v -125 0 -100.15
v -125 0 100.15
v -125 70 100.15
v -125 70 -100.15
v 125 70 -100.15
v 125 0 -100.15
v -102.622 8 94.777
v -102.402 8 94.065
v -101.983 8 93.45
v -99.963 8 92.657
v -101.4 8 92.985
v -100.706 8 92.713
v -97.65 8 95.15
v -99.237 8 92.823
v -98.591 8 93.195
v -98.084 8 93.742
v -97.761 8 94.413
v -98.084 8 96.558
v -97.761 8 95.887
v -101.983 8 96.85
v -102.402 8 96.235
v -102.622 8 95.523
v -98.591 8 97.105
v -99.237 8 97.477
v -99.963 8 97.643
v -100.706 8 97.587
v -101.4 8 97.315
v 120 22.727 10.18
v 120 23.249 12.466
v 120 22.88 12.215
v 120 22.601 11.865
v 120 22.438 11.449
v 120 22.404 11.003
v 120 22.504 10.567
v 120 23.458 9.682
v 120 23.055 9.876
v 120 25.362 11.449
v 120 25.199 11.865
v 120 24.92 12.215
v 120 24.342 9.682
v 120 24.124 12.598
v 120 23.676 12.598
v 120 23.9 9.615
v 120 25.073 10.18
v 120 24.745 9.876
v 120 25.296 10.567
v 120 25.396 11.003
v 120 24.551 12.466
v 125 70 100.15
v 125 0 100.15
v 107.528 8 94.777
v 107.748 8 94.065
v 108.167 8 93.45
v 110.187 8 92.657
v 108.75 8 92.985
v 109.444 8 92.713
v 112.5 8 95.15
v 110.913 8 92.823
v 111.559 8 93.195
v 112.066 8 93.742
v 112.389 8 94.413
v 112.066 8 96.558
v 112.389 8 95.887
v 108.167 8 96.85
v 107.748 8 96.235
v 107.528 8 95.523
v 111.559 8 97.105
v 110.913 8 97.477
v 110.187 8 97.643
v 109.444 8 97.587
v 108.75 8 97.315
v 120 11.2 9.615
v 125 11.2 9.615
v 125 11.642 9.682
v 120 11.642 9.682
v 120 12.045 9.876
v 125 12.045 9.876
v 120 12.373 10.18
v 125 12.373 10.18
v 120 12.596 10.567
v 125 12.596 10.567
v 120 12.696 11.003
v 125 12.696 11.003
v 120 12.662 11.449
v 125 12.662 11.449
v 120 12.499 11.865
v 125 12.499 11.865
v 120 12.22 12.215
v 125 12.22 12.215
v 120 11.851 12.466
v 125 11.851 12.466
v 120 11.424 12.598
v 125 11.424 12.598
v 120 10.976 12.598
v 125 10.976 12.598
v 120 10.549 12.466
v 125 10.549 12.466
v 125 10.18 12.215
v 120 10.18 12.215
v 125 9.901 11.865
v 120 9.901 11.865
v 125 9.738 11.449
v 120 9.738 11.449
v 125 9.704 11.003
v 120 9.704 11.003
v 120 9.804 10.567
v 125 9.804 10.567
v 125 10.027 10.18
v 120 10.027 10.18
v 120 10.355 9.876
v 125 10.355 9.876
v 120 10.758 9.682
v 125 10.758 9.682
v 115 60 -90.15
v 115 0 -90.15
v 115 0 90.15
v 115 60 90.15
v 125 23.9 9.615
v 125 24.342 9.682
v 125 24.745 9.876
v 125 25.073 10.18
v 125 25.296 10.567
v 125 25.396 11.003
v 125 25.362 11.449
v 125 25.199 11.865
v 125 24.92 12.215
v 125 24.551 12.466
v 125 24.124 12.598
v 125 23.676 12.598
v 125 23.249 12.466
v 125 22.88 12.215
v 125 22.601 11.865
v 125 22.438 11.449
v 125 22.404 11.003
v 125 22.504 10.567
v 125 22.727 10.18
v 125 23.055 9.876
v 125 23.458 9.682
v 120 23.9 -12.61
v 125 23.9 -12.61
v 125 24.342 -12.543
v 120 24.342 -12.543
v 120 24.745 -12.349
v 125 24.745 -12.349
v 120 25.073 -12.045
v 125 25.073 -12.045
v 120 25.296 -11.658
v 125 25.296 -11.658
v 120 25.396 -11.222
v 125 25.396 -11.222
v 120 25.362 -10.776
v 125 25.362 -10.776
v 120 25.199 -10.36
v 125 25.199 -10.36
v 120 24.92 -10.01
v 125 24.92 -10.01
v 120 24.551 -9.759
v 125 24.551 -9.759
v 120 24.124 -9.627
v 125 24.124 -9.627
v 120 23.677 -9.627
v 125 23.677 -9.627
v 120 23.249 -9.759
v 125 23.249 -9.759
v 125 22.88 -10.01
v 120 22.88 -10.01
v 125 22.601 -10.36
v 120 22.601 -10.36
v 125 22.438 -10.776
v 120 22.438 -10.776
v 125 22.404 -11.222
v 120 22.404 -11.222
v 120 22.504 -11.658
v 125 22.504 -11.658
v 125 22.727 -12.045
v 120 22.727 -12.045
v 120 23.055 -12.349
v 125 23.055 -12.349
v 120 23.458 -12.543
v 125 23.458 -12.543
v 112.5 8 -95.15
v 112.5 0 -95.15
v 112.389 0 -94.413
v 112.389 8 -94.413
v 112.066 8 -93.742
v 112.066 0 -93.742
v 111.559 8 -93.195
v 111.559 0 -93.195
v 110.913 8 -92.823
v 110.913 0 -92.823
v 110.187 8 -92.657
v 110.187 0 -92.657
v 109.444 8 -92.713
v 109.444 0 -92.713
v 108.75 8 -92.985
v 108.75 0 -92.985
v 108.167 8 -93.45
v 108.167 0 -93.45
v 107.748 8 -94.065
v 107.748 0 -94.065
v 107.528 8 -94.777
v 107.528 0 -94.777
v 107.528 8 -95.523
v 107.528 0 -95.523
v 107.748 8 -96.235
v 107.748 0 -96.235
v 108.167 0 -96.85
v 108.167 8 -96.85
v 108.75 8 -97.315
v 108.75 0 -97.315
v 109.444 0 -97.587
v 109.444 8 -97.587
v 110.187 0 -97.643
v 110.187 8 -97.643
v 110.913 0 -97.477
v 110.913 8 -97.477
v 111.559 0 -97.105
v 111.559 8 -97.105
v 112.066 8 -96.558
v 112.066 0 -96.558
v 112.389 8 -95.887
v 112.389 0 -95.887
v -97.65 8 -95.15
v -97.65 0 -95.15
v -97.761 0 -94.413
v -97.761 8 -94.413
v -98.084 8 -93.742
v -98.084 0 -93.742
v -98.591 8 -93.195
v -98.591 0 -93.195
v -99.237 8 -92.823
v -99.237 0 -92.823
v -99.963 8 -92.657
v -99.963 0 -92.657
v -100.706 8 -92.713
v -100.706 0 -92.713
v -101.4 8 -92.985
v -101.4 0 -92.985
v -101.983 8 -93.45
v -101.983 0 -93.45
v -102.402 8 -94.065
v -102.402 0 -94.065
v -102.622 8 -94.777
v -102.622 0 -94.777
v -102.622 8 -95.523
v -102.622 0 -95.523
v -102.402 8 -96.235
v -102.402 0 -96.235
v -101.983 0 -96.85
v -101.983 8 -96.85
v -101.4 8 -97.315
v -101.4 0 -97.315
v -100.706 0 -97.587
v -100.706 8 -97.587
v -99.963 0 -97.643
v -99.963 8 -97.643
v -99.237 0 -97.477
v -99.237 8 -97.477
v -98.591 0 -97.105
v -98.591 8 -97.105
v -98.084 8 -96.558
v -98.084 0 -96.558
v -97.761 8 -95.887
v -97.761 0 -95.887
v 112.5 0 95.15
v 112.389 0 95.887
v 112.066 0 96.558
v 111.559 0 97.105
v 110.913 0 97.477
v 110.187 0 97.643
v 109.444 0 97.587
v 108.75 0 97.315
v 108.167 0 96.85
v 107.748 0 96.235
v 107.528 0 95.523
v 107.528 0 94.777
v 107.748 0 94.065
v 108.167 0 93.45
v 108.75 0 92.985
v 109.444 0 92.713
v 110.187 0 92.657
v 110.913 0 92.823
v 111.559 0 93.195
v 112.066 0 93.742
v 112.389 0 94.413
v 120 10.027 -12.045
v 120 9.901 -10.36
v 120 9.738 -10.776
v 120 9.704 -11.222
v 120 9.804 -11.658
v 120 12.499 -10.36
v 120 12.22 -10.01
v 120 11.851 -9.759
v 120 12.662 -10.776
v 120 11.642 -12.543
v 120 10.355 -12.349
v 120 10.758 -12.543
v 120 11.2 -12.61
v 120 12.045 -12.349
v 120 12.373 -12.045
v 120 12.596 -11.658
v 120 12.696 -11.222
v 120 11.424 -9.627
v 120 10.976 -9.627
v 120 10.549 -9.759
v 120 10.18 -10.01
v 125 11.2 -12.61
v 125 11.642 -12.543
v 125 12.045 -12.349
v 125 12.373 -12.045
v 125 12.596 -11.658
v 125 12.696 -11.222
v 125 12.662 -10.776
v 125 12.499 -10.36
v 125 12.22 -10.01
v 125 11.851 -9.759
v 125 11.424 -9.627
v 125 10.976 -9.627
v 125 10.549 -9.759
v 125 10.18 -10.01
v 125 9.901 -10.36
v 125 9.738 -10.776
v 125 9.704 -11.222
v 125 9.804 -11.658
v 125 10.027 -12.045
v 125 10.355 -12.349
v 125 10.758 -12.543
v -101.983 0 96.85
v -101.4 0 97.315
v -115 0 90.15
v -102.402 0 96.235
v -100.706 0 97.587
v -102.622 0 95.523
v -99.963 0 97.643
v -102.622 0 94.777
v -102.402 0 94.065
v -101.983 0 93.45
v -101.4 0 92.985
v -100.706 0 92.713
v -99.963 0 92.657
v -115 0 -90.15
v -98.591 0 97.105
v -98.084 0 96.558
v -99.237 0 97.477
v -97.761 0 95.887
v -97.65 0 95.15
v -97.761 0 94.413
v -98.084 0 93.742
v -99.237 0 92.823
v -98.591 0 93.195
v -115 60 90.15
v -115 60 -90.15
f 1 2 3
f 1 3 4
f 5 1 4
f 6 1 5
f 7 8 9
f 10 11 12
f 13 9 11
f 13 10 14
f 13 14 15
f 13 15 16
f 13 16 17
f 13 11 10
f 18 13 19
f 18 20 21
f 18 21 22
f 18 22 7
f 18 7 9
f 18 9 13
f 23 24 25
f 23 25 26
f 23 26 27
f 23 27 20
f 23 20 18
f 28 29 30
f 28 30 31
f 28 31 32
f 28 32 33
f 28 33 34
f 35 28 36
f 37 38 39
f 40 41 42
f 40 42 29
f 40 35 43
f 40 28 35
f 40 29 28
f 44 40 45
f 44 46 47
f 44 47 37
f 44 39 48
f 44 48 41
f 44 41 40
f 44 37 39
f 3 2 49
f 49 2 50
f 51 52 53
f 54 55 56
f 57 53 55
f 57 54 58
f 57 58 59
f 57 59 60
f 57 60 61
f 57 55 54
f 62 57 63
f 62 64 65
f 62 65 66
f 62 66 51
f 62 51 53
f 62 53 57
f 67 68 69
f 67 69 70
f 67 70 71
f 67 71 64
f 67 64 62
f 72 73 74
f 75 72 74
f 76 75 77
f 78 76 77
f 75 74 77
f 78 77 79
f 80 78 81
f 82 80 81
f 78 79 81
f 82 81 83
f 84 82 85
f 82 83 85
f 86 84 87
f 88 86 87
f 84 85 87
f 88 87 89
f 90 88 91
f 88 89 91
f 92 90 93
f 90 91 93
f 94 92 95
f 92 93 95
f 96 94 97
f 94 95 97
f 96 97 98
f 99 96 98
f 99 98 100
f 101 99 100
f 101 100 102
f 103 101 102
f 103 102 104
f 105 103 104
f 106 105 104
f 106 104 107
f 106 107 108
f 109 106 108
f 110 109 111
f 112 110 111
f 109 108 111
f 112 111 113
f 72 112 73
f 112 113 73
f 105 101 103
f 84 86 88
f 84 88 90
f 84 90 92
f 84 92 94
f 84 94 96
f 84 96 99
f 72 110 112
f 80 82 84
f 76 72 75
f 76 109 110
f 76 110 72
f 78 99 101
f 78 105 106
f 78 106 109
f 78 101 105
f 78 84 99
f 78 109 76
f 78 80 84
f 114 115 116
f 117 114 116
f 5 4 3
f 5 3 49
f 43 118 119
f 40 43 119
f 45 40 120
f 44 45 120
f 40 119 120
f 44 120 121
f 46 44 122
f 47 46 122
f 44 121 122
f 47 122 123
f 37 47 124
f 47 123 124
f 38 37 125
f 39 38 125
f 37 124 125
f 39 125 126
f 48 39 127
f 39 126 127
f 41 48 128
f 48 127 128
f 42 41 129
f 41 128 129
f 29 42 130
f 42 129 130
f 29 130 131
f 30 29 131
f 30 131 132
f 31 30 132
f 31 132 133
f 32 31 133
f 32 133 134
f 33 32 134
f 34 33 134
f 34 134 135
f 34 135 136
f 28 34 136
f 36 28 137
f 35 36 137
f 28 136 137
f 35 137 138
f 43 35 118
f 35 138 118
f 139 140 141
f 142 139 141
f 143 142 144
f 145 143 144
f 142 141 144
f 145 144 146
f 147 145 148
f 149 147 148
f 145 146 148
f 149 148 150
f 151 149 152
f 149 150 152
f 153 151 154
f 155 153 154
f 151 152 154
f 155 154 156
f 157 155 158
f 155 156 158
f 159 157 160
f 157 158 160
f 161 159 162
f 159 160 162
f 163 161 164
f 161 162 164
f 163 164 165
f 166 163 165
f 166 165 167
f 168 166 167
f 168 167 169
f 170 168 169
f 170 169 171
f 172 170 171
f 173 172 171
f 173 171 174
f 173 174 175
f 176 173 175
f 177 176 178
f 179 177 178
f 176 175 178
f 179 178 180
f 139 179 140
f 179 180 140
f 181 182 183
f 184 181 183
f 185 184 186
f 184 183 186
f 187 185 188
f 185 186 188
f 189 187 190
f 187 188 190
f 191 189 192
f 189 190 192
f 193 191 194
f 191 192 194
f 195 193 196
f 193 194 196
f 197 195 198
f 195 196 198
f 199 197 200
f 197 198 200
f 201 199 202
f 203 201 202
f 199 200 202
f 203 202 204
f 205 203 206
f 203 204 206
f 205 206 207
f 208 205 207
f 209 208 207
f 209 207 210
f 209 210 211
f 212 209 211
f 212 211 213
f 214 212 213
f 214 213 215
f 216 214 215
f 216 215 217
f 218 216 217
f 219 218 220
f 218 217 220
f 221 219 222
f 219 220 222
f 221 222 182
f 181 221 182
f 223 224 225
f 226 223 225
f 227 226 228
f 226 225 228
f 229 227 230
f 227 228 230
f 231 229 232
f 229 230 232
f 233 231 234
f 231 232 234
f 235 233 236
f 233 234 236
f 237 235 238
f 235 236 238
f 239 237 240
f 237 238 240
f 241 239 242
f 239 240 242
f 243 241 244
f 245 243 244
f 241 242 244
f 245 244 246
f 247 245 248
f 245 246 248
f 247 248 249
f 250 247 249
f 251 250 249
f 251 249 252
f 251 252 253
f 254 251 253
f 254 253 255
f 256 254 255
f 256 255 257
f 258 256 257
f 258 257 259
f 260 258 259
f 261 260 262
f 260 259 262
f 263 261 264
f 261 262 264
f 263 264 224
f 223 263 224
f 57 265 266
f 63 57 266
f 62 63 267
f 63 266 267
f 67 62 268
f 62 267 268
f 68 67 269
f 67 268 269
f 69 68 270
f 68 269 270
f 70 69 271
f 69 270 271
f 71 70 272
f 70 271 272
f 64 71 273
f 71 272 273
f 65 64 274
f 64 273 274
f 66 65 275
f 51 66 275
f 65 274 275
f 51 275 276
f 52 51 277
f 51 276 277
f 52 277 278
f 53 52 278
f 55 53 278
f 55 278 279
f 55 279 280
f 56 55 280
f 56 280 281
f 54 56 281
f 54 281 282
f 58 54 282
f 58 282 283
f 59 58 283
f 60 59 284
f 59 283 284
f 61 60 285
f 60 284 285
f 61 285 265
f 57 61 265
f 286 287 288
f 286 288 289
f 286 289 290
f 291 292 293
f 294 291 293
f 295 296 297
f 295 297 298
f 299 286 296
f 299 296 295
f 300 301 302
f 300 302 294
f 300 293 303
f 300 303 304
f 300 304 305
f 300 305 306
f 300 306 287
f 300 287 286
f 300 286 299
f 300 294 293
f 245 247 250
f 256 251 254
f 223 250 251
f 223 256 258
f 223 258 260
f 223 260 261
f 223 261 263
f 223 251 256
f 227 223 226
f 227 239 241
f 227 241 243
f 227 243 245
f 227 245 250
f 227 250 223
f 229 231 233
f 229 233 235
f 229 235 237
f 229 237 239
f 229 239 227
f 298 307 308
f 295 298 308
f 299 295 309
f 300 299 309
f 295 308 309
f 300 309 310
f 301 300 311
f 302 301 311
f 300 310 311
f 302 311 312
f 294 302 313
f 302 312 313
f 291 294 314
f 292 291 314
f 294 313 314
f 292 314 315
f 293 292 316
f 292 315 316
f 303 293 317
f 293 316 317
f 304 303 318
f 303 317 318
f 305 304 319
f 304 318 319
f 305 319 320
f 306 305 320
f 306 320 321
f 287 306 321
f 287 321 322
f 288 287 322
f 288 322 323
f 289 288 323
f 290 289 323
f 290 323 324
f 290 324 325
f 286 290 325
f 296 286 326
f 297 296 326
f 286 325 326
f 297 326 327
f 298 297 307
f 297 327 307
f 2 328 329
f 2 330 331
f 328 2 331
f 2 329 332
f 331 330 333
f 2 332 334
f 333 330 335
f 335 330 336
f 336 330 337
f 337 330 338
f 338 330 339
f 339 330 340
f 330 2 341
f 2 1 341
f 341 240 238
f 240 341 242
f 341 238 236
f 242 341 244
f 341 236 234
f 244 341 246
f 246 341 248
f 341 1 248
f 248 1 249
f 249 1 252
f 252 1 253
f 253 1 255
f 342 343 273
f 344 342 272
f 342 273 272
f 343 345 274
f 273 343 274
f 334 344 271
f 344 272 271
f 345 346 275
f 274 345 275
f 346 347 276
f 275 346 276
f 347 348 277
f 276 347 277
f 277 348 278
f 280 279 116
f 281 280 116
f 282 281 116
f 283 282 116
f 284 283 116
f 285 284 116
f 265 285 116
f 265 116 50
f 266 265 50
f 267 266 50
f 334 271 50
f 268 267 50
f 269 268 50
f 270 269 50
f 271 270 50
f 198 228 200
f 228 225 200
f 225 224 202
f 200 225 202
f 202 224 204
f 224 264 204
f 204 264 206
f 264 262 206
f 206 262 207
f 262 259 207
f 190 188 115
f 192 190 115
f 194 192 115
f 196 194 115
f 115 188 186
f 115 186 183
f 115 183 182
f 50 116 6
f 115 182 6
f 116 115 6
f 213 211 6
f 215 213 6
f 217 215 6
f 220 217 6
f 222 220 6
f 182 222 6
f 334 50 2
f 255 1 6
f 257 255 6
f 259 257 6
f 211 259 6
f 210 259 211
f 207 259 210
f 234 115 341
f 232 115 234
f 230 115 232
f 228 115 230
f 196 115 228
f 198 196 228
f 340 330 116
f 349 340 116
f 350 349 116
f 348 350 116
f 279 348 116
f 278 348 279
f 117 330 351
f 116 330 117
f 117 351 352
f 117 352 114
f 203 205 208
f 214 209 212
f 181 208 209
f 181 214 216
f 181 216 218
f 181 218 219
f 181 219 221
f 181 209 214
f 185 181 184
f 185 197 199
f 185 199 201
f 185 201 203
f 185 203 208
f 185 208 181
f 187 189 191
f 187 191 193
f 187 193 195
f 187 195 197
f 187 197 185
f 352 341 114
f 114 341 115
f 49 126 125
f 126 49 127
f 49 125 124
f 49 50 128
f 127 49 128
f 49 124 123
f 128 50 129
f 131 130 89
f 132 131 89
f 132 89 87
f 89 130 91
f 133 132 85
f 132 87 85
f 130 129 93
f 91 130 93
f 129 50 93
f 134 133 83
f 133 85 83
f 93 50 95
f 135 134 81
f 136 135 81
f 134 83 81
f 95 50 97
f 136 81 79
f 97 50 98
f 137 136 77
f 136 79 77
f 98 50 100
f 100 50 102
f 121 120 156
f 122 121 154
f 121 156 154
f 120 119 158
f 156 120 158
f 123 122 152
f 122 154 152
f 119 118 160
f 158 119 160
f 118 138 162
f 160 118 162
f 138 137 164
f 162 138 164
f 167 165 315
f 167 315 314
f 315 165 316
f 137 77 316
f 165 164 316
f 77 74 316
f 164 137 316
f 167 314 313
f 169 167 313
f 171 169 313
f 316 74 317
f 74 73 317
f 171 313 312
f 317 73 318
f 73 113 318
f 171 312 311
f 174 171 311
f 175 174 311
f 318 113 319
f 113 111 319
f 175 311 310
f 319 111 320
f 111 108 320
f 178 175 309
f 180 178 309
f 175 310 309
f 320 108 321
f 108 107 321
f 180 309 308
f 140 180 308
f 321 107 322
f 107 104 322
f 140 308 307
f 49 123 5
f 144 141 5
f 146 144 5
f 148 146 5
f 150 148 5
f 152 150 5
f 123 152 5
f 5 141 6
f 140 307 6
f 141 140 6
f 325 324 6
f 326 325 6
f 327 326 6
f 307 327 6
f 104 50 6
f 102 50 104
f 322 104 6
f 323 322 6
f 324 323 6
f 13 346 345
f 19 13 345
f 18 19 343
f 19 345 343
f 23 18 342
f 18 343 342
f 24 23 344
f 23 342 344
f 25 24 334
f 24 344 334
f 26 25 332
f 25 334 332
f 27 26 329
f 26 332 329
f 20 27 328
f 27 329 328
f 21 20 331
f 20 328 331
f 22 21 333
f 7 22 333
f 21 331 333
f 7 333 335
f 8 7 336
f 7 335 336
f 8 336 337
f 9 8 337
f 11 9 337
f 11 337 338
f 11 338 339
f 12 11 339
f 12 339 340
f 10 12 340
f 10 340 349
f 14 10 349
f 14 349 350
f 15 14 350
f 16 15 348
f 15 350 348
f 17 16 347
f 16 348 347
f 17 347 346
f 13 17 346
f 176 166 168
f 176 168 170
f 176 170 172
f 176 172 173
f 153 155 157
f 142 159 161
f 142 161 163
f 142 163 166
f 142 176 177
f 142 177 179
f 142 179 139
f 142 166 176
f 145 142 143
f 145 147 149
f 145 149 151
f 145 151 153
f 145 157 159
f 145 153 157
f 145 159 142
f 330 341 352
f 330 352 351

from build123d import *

# Parameters (mm, degrees)
SKETCH1_W           = 250
SKETCH1_H           = 200.3
BOSS_EXTRUDE1_DEPTH = 70
SKETCH2_W           = 230
SKETCH2_H           = 180.3
CUT_EXTRUDE1_DEPTH  = 60
SKETCH3_R           = 1.5
CUT_EXTRUDE2_DEPTH  = 5
SKETCH4_R           = 2.5
CUT_EXTRUDE3_DEPTH  = 8


with BuildPart() as part:
    # Sketch1 → Boss-Extrude1 (new body)
    with BuildSketch(Plane(origin=(0, 0, 0), x_dir=(1, 0, 0), z_dir=(0, 1, 0))):
        Rectangle(SKETCH1_W, SKETCH1_H)
    extrude(amount=BOSS_EXTRUDE1_DEPTH)

    # Sketch2 → Cut-Extrude1 (cut)
    with BuildSketch(Plane.XZ):
        Rectangle(SKETCH2_W, SKETCH2_H)
    extrude(amount=-CUT_EXTRUDE1_DEPTH, mode=Mode.SUBTRACT)

    # Sketch3 → Cut-Extrude2 (cut)
    with BuildSketch(Plane(origin=(125, 0, 0), x_dir=(0, 0, -1), z_dir=(1, 0, 0))):
        with Locations((-11.115, 23.9)):
            Circle(SKETCH3_R)
        with Locations((11.11, 23.900076156)):
            Circle(SKETCH3_R)
        with Locations((-11.115, 11.2)):
            Circle(SKETCH3_R)
        with Locations((11.11, 11.2)):
            Circle(SKETCH3_R)
    extrude(amount=-CUT_EXTRUDE2_DEPTH, mode=Mode.SUBTRACT)

    # Sketch4 → Cut-Extrude3 (cut)
    with BuildSketch(Plane.XZ):
        with Locations((-100.15, 95.15)):
            Circle(SKETCH4_R)
        with Locations((-100.15, -95.15)):
            Circle(SKETCH4_R)
        with Locations((110, -95.15)):
            Circle(SKETCH4_R)
        with Locations((110, 95.15)):
            Circle(SKETCH4_R)
    extrude(amount=-CUT_EXTRUDE3_DEPTH, mode=Mode.SUBTRACT)


solid = part.part
